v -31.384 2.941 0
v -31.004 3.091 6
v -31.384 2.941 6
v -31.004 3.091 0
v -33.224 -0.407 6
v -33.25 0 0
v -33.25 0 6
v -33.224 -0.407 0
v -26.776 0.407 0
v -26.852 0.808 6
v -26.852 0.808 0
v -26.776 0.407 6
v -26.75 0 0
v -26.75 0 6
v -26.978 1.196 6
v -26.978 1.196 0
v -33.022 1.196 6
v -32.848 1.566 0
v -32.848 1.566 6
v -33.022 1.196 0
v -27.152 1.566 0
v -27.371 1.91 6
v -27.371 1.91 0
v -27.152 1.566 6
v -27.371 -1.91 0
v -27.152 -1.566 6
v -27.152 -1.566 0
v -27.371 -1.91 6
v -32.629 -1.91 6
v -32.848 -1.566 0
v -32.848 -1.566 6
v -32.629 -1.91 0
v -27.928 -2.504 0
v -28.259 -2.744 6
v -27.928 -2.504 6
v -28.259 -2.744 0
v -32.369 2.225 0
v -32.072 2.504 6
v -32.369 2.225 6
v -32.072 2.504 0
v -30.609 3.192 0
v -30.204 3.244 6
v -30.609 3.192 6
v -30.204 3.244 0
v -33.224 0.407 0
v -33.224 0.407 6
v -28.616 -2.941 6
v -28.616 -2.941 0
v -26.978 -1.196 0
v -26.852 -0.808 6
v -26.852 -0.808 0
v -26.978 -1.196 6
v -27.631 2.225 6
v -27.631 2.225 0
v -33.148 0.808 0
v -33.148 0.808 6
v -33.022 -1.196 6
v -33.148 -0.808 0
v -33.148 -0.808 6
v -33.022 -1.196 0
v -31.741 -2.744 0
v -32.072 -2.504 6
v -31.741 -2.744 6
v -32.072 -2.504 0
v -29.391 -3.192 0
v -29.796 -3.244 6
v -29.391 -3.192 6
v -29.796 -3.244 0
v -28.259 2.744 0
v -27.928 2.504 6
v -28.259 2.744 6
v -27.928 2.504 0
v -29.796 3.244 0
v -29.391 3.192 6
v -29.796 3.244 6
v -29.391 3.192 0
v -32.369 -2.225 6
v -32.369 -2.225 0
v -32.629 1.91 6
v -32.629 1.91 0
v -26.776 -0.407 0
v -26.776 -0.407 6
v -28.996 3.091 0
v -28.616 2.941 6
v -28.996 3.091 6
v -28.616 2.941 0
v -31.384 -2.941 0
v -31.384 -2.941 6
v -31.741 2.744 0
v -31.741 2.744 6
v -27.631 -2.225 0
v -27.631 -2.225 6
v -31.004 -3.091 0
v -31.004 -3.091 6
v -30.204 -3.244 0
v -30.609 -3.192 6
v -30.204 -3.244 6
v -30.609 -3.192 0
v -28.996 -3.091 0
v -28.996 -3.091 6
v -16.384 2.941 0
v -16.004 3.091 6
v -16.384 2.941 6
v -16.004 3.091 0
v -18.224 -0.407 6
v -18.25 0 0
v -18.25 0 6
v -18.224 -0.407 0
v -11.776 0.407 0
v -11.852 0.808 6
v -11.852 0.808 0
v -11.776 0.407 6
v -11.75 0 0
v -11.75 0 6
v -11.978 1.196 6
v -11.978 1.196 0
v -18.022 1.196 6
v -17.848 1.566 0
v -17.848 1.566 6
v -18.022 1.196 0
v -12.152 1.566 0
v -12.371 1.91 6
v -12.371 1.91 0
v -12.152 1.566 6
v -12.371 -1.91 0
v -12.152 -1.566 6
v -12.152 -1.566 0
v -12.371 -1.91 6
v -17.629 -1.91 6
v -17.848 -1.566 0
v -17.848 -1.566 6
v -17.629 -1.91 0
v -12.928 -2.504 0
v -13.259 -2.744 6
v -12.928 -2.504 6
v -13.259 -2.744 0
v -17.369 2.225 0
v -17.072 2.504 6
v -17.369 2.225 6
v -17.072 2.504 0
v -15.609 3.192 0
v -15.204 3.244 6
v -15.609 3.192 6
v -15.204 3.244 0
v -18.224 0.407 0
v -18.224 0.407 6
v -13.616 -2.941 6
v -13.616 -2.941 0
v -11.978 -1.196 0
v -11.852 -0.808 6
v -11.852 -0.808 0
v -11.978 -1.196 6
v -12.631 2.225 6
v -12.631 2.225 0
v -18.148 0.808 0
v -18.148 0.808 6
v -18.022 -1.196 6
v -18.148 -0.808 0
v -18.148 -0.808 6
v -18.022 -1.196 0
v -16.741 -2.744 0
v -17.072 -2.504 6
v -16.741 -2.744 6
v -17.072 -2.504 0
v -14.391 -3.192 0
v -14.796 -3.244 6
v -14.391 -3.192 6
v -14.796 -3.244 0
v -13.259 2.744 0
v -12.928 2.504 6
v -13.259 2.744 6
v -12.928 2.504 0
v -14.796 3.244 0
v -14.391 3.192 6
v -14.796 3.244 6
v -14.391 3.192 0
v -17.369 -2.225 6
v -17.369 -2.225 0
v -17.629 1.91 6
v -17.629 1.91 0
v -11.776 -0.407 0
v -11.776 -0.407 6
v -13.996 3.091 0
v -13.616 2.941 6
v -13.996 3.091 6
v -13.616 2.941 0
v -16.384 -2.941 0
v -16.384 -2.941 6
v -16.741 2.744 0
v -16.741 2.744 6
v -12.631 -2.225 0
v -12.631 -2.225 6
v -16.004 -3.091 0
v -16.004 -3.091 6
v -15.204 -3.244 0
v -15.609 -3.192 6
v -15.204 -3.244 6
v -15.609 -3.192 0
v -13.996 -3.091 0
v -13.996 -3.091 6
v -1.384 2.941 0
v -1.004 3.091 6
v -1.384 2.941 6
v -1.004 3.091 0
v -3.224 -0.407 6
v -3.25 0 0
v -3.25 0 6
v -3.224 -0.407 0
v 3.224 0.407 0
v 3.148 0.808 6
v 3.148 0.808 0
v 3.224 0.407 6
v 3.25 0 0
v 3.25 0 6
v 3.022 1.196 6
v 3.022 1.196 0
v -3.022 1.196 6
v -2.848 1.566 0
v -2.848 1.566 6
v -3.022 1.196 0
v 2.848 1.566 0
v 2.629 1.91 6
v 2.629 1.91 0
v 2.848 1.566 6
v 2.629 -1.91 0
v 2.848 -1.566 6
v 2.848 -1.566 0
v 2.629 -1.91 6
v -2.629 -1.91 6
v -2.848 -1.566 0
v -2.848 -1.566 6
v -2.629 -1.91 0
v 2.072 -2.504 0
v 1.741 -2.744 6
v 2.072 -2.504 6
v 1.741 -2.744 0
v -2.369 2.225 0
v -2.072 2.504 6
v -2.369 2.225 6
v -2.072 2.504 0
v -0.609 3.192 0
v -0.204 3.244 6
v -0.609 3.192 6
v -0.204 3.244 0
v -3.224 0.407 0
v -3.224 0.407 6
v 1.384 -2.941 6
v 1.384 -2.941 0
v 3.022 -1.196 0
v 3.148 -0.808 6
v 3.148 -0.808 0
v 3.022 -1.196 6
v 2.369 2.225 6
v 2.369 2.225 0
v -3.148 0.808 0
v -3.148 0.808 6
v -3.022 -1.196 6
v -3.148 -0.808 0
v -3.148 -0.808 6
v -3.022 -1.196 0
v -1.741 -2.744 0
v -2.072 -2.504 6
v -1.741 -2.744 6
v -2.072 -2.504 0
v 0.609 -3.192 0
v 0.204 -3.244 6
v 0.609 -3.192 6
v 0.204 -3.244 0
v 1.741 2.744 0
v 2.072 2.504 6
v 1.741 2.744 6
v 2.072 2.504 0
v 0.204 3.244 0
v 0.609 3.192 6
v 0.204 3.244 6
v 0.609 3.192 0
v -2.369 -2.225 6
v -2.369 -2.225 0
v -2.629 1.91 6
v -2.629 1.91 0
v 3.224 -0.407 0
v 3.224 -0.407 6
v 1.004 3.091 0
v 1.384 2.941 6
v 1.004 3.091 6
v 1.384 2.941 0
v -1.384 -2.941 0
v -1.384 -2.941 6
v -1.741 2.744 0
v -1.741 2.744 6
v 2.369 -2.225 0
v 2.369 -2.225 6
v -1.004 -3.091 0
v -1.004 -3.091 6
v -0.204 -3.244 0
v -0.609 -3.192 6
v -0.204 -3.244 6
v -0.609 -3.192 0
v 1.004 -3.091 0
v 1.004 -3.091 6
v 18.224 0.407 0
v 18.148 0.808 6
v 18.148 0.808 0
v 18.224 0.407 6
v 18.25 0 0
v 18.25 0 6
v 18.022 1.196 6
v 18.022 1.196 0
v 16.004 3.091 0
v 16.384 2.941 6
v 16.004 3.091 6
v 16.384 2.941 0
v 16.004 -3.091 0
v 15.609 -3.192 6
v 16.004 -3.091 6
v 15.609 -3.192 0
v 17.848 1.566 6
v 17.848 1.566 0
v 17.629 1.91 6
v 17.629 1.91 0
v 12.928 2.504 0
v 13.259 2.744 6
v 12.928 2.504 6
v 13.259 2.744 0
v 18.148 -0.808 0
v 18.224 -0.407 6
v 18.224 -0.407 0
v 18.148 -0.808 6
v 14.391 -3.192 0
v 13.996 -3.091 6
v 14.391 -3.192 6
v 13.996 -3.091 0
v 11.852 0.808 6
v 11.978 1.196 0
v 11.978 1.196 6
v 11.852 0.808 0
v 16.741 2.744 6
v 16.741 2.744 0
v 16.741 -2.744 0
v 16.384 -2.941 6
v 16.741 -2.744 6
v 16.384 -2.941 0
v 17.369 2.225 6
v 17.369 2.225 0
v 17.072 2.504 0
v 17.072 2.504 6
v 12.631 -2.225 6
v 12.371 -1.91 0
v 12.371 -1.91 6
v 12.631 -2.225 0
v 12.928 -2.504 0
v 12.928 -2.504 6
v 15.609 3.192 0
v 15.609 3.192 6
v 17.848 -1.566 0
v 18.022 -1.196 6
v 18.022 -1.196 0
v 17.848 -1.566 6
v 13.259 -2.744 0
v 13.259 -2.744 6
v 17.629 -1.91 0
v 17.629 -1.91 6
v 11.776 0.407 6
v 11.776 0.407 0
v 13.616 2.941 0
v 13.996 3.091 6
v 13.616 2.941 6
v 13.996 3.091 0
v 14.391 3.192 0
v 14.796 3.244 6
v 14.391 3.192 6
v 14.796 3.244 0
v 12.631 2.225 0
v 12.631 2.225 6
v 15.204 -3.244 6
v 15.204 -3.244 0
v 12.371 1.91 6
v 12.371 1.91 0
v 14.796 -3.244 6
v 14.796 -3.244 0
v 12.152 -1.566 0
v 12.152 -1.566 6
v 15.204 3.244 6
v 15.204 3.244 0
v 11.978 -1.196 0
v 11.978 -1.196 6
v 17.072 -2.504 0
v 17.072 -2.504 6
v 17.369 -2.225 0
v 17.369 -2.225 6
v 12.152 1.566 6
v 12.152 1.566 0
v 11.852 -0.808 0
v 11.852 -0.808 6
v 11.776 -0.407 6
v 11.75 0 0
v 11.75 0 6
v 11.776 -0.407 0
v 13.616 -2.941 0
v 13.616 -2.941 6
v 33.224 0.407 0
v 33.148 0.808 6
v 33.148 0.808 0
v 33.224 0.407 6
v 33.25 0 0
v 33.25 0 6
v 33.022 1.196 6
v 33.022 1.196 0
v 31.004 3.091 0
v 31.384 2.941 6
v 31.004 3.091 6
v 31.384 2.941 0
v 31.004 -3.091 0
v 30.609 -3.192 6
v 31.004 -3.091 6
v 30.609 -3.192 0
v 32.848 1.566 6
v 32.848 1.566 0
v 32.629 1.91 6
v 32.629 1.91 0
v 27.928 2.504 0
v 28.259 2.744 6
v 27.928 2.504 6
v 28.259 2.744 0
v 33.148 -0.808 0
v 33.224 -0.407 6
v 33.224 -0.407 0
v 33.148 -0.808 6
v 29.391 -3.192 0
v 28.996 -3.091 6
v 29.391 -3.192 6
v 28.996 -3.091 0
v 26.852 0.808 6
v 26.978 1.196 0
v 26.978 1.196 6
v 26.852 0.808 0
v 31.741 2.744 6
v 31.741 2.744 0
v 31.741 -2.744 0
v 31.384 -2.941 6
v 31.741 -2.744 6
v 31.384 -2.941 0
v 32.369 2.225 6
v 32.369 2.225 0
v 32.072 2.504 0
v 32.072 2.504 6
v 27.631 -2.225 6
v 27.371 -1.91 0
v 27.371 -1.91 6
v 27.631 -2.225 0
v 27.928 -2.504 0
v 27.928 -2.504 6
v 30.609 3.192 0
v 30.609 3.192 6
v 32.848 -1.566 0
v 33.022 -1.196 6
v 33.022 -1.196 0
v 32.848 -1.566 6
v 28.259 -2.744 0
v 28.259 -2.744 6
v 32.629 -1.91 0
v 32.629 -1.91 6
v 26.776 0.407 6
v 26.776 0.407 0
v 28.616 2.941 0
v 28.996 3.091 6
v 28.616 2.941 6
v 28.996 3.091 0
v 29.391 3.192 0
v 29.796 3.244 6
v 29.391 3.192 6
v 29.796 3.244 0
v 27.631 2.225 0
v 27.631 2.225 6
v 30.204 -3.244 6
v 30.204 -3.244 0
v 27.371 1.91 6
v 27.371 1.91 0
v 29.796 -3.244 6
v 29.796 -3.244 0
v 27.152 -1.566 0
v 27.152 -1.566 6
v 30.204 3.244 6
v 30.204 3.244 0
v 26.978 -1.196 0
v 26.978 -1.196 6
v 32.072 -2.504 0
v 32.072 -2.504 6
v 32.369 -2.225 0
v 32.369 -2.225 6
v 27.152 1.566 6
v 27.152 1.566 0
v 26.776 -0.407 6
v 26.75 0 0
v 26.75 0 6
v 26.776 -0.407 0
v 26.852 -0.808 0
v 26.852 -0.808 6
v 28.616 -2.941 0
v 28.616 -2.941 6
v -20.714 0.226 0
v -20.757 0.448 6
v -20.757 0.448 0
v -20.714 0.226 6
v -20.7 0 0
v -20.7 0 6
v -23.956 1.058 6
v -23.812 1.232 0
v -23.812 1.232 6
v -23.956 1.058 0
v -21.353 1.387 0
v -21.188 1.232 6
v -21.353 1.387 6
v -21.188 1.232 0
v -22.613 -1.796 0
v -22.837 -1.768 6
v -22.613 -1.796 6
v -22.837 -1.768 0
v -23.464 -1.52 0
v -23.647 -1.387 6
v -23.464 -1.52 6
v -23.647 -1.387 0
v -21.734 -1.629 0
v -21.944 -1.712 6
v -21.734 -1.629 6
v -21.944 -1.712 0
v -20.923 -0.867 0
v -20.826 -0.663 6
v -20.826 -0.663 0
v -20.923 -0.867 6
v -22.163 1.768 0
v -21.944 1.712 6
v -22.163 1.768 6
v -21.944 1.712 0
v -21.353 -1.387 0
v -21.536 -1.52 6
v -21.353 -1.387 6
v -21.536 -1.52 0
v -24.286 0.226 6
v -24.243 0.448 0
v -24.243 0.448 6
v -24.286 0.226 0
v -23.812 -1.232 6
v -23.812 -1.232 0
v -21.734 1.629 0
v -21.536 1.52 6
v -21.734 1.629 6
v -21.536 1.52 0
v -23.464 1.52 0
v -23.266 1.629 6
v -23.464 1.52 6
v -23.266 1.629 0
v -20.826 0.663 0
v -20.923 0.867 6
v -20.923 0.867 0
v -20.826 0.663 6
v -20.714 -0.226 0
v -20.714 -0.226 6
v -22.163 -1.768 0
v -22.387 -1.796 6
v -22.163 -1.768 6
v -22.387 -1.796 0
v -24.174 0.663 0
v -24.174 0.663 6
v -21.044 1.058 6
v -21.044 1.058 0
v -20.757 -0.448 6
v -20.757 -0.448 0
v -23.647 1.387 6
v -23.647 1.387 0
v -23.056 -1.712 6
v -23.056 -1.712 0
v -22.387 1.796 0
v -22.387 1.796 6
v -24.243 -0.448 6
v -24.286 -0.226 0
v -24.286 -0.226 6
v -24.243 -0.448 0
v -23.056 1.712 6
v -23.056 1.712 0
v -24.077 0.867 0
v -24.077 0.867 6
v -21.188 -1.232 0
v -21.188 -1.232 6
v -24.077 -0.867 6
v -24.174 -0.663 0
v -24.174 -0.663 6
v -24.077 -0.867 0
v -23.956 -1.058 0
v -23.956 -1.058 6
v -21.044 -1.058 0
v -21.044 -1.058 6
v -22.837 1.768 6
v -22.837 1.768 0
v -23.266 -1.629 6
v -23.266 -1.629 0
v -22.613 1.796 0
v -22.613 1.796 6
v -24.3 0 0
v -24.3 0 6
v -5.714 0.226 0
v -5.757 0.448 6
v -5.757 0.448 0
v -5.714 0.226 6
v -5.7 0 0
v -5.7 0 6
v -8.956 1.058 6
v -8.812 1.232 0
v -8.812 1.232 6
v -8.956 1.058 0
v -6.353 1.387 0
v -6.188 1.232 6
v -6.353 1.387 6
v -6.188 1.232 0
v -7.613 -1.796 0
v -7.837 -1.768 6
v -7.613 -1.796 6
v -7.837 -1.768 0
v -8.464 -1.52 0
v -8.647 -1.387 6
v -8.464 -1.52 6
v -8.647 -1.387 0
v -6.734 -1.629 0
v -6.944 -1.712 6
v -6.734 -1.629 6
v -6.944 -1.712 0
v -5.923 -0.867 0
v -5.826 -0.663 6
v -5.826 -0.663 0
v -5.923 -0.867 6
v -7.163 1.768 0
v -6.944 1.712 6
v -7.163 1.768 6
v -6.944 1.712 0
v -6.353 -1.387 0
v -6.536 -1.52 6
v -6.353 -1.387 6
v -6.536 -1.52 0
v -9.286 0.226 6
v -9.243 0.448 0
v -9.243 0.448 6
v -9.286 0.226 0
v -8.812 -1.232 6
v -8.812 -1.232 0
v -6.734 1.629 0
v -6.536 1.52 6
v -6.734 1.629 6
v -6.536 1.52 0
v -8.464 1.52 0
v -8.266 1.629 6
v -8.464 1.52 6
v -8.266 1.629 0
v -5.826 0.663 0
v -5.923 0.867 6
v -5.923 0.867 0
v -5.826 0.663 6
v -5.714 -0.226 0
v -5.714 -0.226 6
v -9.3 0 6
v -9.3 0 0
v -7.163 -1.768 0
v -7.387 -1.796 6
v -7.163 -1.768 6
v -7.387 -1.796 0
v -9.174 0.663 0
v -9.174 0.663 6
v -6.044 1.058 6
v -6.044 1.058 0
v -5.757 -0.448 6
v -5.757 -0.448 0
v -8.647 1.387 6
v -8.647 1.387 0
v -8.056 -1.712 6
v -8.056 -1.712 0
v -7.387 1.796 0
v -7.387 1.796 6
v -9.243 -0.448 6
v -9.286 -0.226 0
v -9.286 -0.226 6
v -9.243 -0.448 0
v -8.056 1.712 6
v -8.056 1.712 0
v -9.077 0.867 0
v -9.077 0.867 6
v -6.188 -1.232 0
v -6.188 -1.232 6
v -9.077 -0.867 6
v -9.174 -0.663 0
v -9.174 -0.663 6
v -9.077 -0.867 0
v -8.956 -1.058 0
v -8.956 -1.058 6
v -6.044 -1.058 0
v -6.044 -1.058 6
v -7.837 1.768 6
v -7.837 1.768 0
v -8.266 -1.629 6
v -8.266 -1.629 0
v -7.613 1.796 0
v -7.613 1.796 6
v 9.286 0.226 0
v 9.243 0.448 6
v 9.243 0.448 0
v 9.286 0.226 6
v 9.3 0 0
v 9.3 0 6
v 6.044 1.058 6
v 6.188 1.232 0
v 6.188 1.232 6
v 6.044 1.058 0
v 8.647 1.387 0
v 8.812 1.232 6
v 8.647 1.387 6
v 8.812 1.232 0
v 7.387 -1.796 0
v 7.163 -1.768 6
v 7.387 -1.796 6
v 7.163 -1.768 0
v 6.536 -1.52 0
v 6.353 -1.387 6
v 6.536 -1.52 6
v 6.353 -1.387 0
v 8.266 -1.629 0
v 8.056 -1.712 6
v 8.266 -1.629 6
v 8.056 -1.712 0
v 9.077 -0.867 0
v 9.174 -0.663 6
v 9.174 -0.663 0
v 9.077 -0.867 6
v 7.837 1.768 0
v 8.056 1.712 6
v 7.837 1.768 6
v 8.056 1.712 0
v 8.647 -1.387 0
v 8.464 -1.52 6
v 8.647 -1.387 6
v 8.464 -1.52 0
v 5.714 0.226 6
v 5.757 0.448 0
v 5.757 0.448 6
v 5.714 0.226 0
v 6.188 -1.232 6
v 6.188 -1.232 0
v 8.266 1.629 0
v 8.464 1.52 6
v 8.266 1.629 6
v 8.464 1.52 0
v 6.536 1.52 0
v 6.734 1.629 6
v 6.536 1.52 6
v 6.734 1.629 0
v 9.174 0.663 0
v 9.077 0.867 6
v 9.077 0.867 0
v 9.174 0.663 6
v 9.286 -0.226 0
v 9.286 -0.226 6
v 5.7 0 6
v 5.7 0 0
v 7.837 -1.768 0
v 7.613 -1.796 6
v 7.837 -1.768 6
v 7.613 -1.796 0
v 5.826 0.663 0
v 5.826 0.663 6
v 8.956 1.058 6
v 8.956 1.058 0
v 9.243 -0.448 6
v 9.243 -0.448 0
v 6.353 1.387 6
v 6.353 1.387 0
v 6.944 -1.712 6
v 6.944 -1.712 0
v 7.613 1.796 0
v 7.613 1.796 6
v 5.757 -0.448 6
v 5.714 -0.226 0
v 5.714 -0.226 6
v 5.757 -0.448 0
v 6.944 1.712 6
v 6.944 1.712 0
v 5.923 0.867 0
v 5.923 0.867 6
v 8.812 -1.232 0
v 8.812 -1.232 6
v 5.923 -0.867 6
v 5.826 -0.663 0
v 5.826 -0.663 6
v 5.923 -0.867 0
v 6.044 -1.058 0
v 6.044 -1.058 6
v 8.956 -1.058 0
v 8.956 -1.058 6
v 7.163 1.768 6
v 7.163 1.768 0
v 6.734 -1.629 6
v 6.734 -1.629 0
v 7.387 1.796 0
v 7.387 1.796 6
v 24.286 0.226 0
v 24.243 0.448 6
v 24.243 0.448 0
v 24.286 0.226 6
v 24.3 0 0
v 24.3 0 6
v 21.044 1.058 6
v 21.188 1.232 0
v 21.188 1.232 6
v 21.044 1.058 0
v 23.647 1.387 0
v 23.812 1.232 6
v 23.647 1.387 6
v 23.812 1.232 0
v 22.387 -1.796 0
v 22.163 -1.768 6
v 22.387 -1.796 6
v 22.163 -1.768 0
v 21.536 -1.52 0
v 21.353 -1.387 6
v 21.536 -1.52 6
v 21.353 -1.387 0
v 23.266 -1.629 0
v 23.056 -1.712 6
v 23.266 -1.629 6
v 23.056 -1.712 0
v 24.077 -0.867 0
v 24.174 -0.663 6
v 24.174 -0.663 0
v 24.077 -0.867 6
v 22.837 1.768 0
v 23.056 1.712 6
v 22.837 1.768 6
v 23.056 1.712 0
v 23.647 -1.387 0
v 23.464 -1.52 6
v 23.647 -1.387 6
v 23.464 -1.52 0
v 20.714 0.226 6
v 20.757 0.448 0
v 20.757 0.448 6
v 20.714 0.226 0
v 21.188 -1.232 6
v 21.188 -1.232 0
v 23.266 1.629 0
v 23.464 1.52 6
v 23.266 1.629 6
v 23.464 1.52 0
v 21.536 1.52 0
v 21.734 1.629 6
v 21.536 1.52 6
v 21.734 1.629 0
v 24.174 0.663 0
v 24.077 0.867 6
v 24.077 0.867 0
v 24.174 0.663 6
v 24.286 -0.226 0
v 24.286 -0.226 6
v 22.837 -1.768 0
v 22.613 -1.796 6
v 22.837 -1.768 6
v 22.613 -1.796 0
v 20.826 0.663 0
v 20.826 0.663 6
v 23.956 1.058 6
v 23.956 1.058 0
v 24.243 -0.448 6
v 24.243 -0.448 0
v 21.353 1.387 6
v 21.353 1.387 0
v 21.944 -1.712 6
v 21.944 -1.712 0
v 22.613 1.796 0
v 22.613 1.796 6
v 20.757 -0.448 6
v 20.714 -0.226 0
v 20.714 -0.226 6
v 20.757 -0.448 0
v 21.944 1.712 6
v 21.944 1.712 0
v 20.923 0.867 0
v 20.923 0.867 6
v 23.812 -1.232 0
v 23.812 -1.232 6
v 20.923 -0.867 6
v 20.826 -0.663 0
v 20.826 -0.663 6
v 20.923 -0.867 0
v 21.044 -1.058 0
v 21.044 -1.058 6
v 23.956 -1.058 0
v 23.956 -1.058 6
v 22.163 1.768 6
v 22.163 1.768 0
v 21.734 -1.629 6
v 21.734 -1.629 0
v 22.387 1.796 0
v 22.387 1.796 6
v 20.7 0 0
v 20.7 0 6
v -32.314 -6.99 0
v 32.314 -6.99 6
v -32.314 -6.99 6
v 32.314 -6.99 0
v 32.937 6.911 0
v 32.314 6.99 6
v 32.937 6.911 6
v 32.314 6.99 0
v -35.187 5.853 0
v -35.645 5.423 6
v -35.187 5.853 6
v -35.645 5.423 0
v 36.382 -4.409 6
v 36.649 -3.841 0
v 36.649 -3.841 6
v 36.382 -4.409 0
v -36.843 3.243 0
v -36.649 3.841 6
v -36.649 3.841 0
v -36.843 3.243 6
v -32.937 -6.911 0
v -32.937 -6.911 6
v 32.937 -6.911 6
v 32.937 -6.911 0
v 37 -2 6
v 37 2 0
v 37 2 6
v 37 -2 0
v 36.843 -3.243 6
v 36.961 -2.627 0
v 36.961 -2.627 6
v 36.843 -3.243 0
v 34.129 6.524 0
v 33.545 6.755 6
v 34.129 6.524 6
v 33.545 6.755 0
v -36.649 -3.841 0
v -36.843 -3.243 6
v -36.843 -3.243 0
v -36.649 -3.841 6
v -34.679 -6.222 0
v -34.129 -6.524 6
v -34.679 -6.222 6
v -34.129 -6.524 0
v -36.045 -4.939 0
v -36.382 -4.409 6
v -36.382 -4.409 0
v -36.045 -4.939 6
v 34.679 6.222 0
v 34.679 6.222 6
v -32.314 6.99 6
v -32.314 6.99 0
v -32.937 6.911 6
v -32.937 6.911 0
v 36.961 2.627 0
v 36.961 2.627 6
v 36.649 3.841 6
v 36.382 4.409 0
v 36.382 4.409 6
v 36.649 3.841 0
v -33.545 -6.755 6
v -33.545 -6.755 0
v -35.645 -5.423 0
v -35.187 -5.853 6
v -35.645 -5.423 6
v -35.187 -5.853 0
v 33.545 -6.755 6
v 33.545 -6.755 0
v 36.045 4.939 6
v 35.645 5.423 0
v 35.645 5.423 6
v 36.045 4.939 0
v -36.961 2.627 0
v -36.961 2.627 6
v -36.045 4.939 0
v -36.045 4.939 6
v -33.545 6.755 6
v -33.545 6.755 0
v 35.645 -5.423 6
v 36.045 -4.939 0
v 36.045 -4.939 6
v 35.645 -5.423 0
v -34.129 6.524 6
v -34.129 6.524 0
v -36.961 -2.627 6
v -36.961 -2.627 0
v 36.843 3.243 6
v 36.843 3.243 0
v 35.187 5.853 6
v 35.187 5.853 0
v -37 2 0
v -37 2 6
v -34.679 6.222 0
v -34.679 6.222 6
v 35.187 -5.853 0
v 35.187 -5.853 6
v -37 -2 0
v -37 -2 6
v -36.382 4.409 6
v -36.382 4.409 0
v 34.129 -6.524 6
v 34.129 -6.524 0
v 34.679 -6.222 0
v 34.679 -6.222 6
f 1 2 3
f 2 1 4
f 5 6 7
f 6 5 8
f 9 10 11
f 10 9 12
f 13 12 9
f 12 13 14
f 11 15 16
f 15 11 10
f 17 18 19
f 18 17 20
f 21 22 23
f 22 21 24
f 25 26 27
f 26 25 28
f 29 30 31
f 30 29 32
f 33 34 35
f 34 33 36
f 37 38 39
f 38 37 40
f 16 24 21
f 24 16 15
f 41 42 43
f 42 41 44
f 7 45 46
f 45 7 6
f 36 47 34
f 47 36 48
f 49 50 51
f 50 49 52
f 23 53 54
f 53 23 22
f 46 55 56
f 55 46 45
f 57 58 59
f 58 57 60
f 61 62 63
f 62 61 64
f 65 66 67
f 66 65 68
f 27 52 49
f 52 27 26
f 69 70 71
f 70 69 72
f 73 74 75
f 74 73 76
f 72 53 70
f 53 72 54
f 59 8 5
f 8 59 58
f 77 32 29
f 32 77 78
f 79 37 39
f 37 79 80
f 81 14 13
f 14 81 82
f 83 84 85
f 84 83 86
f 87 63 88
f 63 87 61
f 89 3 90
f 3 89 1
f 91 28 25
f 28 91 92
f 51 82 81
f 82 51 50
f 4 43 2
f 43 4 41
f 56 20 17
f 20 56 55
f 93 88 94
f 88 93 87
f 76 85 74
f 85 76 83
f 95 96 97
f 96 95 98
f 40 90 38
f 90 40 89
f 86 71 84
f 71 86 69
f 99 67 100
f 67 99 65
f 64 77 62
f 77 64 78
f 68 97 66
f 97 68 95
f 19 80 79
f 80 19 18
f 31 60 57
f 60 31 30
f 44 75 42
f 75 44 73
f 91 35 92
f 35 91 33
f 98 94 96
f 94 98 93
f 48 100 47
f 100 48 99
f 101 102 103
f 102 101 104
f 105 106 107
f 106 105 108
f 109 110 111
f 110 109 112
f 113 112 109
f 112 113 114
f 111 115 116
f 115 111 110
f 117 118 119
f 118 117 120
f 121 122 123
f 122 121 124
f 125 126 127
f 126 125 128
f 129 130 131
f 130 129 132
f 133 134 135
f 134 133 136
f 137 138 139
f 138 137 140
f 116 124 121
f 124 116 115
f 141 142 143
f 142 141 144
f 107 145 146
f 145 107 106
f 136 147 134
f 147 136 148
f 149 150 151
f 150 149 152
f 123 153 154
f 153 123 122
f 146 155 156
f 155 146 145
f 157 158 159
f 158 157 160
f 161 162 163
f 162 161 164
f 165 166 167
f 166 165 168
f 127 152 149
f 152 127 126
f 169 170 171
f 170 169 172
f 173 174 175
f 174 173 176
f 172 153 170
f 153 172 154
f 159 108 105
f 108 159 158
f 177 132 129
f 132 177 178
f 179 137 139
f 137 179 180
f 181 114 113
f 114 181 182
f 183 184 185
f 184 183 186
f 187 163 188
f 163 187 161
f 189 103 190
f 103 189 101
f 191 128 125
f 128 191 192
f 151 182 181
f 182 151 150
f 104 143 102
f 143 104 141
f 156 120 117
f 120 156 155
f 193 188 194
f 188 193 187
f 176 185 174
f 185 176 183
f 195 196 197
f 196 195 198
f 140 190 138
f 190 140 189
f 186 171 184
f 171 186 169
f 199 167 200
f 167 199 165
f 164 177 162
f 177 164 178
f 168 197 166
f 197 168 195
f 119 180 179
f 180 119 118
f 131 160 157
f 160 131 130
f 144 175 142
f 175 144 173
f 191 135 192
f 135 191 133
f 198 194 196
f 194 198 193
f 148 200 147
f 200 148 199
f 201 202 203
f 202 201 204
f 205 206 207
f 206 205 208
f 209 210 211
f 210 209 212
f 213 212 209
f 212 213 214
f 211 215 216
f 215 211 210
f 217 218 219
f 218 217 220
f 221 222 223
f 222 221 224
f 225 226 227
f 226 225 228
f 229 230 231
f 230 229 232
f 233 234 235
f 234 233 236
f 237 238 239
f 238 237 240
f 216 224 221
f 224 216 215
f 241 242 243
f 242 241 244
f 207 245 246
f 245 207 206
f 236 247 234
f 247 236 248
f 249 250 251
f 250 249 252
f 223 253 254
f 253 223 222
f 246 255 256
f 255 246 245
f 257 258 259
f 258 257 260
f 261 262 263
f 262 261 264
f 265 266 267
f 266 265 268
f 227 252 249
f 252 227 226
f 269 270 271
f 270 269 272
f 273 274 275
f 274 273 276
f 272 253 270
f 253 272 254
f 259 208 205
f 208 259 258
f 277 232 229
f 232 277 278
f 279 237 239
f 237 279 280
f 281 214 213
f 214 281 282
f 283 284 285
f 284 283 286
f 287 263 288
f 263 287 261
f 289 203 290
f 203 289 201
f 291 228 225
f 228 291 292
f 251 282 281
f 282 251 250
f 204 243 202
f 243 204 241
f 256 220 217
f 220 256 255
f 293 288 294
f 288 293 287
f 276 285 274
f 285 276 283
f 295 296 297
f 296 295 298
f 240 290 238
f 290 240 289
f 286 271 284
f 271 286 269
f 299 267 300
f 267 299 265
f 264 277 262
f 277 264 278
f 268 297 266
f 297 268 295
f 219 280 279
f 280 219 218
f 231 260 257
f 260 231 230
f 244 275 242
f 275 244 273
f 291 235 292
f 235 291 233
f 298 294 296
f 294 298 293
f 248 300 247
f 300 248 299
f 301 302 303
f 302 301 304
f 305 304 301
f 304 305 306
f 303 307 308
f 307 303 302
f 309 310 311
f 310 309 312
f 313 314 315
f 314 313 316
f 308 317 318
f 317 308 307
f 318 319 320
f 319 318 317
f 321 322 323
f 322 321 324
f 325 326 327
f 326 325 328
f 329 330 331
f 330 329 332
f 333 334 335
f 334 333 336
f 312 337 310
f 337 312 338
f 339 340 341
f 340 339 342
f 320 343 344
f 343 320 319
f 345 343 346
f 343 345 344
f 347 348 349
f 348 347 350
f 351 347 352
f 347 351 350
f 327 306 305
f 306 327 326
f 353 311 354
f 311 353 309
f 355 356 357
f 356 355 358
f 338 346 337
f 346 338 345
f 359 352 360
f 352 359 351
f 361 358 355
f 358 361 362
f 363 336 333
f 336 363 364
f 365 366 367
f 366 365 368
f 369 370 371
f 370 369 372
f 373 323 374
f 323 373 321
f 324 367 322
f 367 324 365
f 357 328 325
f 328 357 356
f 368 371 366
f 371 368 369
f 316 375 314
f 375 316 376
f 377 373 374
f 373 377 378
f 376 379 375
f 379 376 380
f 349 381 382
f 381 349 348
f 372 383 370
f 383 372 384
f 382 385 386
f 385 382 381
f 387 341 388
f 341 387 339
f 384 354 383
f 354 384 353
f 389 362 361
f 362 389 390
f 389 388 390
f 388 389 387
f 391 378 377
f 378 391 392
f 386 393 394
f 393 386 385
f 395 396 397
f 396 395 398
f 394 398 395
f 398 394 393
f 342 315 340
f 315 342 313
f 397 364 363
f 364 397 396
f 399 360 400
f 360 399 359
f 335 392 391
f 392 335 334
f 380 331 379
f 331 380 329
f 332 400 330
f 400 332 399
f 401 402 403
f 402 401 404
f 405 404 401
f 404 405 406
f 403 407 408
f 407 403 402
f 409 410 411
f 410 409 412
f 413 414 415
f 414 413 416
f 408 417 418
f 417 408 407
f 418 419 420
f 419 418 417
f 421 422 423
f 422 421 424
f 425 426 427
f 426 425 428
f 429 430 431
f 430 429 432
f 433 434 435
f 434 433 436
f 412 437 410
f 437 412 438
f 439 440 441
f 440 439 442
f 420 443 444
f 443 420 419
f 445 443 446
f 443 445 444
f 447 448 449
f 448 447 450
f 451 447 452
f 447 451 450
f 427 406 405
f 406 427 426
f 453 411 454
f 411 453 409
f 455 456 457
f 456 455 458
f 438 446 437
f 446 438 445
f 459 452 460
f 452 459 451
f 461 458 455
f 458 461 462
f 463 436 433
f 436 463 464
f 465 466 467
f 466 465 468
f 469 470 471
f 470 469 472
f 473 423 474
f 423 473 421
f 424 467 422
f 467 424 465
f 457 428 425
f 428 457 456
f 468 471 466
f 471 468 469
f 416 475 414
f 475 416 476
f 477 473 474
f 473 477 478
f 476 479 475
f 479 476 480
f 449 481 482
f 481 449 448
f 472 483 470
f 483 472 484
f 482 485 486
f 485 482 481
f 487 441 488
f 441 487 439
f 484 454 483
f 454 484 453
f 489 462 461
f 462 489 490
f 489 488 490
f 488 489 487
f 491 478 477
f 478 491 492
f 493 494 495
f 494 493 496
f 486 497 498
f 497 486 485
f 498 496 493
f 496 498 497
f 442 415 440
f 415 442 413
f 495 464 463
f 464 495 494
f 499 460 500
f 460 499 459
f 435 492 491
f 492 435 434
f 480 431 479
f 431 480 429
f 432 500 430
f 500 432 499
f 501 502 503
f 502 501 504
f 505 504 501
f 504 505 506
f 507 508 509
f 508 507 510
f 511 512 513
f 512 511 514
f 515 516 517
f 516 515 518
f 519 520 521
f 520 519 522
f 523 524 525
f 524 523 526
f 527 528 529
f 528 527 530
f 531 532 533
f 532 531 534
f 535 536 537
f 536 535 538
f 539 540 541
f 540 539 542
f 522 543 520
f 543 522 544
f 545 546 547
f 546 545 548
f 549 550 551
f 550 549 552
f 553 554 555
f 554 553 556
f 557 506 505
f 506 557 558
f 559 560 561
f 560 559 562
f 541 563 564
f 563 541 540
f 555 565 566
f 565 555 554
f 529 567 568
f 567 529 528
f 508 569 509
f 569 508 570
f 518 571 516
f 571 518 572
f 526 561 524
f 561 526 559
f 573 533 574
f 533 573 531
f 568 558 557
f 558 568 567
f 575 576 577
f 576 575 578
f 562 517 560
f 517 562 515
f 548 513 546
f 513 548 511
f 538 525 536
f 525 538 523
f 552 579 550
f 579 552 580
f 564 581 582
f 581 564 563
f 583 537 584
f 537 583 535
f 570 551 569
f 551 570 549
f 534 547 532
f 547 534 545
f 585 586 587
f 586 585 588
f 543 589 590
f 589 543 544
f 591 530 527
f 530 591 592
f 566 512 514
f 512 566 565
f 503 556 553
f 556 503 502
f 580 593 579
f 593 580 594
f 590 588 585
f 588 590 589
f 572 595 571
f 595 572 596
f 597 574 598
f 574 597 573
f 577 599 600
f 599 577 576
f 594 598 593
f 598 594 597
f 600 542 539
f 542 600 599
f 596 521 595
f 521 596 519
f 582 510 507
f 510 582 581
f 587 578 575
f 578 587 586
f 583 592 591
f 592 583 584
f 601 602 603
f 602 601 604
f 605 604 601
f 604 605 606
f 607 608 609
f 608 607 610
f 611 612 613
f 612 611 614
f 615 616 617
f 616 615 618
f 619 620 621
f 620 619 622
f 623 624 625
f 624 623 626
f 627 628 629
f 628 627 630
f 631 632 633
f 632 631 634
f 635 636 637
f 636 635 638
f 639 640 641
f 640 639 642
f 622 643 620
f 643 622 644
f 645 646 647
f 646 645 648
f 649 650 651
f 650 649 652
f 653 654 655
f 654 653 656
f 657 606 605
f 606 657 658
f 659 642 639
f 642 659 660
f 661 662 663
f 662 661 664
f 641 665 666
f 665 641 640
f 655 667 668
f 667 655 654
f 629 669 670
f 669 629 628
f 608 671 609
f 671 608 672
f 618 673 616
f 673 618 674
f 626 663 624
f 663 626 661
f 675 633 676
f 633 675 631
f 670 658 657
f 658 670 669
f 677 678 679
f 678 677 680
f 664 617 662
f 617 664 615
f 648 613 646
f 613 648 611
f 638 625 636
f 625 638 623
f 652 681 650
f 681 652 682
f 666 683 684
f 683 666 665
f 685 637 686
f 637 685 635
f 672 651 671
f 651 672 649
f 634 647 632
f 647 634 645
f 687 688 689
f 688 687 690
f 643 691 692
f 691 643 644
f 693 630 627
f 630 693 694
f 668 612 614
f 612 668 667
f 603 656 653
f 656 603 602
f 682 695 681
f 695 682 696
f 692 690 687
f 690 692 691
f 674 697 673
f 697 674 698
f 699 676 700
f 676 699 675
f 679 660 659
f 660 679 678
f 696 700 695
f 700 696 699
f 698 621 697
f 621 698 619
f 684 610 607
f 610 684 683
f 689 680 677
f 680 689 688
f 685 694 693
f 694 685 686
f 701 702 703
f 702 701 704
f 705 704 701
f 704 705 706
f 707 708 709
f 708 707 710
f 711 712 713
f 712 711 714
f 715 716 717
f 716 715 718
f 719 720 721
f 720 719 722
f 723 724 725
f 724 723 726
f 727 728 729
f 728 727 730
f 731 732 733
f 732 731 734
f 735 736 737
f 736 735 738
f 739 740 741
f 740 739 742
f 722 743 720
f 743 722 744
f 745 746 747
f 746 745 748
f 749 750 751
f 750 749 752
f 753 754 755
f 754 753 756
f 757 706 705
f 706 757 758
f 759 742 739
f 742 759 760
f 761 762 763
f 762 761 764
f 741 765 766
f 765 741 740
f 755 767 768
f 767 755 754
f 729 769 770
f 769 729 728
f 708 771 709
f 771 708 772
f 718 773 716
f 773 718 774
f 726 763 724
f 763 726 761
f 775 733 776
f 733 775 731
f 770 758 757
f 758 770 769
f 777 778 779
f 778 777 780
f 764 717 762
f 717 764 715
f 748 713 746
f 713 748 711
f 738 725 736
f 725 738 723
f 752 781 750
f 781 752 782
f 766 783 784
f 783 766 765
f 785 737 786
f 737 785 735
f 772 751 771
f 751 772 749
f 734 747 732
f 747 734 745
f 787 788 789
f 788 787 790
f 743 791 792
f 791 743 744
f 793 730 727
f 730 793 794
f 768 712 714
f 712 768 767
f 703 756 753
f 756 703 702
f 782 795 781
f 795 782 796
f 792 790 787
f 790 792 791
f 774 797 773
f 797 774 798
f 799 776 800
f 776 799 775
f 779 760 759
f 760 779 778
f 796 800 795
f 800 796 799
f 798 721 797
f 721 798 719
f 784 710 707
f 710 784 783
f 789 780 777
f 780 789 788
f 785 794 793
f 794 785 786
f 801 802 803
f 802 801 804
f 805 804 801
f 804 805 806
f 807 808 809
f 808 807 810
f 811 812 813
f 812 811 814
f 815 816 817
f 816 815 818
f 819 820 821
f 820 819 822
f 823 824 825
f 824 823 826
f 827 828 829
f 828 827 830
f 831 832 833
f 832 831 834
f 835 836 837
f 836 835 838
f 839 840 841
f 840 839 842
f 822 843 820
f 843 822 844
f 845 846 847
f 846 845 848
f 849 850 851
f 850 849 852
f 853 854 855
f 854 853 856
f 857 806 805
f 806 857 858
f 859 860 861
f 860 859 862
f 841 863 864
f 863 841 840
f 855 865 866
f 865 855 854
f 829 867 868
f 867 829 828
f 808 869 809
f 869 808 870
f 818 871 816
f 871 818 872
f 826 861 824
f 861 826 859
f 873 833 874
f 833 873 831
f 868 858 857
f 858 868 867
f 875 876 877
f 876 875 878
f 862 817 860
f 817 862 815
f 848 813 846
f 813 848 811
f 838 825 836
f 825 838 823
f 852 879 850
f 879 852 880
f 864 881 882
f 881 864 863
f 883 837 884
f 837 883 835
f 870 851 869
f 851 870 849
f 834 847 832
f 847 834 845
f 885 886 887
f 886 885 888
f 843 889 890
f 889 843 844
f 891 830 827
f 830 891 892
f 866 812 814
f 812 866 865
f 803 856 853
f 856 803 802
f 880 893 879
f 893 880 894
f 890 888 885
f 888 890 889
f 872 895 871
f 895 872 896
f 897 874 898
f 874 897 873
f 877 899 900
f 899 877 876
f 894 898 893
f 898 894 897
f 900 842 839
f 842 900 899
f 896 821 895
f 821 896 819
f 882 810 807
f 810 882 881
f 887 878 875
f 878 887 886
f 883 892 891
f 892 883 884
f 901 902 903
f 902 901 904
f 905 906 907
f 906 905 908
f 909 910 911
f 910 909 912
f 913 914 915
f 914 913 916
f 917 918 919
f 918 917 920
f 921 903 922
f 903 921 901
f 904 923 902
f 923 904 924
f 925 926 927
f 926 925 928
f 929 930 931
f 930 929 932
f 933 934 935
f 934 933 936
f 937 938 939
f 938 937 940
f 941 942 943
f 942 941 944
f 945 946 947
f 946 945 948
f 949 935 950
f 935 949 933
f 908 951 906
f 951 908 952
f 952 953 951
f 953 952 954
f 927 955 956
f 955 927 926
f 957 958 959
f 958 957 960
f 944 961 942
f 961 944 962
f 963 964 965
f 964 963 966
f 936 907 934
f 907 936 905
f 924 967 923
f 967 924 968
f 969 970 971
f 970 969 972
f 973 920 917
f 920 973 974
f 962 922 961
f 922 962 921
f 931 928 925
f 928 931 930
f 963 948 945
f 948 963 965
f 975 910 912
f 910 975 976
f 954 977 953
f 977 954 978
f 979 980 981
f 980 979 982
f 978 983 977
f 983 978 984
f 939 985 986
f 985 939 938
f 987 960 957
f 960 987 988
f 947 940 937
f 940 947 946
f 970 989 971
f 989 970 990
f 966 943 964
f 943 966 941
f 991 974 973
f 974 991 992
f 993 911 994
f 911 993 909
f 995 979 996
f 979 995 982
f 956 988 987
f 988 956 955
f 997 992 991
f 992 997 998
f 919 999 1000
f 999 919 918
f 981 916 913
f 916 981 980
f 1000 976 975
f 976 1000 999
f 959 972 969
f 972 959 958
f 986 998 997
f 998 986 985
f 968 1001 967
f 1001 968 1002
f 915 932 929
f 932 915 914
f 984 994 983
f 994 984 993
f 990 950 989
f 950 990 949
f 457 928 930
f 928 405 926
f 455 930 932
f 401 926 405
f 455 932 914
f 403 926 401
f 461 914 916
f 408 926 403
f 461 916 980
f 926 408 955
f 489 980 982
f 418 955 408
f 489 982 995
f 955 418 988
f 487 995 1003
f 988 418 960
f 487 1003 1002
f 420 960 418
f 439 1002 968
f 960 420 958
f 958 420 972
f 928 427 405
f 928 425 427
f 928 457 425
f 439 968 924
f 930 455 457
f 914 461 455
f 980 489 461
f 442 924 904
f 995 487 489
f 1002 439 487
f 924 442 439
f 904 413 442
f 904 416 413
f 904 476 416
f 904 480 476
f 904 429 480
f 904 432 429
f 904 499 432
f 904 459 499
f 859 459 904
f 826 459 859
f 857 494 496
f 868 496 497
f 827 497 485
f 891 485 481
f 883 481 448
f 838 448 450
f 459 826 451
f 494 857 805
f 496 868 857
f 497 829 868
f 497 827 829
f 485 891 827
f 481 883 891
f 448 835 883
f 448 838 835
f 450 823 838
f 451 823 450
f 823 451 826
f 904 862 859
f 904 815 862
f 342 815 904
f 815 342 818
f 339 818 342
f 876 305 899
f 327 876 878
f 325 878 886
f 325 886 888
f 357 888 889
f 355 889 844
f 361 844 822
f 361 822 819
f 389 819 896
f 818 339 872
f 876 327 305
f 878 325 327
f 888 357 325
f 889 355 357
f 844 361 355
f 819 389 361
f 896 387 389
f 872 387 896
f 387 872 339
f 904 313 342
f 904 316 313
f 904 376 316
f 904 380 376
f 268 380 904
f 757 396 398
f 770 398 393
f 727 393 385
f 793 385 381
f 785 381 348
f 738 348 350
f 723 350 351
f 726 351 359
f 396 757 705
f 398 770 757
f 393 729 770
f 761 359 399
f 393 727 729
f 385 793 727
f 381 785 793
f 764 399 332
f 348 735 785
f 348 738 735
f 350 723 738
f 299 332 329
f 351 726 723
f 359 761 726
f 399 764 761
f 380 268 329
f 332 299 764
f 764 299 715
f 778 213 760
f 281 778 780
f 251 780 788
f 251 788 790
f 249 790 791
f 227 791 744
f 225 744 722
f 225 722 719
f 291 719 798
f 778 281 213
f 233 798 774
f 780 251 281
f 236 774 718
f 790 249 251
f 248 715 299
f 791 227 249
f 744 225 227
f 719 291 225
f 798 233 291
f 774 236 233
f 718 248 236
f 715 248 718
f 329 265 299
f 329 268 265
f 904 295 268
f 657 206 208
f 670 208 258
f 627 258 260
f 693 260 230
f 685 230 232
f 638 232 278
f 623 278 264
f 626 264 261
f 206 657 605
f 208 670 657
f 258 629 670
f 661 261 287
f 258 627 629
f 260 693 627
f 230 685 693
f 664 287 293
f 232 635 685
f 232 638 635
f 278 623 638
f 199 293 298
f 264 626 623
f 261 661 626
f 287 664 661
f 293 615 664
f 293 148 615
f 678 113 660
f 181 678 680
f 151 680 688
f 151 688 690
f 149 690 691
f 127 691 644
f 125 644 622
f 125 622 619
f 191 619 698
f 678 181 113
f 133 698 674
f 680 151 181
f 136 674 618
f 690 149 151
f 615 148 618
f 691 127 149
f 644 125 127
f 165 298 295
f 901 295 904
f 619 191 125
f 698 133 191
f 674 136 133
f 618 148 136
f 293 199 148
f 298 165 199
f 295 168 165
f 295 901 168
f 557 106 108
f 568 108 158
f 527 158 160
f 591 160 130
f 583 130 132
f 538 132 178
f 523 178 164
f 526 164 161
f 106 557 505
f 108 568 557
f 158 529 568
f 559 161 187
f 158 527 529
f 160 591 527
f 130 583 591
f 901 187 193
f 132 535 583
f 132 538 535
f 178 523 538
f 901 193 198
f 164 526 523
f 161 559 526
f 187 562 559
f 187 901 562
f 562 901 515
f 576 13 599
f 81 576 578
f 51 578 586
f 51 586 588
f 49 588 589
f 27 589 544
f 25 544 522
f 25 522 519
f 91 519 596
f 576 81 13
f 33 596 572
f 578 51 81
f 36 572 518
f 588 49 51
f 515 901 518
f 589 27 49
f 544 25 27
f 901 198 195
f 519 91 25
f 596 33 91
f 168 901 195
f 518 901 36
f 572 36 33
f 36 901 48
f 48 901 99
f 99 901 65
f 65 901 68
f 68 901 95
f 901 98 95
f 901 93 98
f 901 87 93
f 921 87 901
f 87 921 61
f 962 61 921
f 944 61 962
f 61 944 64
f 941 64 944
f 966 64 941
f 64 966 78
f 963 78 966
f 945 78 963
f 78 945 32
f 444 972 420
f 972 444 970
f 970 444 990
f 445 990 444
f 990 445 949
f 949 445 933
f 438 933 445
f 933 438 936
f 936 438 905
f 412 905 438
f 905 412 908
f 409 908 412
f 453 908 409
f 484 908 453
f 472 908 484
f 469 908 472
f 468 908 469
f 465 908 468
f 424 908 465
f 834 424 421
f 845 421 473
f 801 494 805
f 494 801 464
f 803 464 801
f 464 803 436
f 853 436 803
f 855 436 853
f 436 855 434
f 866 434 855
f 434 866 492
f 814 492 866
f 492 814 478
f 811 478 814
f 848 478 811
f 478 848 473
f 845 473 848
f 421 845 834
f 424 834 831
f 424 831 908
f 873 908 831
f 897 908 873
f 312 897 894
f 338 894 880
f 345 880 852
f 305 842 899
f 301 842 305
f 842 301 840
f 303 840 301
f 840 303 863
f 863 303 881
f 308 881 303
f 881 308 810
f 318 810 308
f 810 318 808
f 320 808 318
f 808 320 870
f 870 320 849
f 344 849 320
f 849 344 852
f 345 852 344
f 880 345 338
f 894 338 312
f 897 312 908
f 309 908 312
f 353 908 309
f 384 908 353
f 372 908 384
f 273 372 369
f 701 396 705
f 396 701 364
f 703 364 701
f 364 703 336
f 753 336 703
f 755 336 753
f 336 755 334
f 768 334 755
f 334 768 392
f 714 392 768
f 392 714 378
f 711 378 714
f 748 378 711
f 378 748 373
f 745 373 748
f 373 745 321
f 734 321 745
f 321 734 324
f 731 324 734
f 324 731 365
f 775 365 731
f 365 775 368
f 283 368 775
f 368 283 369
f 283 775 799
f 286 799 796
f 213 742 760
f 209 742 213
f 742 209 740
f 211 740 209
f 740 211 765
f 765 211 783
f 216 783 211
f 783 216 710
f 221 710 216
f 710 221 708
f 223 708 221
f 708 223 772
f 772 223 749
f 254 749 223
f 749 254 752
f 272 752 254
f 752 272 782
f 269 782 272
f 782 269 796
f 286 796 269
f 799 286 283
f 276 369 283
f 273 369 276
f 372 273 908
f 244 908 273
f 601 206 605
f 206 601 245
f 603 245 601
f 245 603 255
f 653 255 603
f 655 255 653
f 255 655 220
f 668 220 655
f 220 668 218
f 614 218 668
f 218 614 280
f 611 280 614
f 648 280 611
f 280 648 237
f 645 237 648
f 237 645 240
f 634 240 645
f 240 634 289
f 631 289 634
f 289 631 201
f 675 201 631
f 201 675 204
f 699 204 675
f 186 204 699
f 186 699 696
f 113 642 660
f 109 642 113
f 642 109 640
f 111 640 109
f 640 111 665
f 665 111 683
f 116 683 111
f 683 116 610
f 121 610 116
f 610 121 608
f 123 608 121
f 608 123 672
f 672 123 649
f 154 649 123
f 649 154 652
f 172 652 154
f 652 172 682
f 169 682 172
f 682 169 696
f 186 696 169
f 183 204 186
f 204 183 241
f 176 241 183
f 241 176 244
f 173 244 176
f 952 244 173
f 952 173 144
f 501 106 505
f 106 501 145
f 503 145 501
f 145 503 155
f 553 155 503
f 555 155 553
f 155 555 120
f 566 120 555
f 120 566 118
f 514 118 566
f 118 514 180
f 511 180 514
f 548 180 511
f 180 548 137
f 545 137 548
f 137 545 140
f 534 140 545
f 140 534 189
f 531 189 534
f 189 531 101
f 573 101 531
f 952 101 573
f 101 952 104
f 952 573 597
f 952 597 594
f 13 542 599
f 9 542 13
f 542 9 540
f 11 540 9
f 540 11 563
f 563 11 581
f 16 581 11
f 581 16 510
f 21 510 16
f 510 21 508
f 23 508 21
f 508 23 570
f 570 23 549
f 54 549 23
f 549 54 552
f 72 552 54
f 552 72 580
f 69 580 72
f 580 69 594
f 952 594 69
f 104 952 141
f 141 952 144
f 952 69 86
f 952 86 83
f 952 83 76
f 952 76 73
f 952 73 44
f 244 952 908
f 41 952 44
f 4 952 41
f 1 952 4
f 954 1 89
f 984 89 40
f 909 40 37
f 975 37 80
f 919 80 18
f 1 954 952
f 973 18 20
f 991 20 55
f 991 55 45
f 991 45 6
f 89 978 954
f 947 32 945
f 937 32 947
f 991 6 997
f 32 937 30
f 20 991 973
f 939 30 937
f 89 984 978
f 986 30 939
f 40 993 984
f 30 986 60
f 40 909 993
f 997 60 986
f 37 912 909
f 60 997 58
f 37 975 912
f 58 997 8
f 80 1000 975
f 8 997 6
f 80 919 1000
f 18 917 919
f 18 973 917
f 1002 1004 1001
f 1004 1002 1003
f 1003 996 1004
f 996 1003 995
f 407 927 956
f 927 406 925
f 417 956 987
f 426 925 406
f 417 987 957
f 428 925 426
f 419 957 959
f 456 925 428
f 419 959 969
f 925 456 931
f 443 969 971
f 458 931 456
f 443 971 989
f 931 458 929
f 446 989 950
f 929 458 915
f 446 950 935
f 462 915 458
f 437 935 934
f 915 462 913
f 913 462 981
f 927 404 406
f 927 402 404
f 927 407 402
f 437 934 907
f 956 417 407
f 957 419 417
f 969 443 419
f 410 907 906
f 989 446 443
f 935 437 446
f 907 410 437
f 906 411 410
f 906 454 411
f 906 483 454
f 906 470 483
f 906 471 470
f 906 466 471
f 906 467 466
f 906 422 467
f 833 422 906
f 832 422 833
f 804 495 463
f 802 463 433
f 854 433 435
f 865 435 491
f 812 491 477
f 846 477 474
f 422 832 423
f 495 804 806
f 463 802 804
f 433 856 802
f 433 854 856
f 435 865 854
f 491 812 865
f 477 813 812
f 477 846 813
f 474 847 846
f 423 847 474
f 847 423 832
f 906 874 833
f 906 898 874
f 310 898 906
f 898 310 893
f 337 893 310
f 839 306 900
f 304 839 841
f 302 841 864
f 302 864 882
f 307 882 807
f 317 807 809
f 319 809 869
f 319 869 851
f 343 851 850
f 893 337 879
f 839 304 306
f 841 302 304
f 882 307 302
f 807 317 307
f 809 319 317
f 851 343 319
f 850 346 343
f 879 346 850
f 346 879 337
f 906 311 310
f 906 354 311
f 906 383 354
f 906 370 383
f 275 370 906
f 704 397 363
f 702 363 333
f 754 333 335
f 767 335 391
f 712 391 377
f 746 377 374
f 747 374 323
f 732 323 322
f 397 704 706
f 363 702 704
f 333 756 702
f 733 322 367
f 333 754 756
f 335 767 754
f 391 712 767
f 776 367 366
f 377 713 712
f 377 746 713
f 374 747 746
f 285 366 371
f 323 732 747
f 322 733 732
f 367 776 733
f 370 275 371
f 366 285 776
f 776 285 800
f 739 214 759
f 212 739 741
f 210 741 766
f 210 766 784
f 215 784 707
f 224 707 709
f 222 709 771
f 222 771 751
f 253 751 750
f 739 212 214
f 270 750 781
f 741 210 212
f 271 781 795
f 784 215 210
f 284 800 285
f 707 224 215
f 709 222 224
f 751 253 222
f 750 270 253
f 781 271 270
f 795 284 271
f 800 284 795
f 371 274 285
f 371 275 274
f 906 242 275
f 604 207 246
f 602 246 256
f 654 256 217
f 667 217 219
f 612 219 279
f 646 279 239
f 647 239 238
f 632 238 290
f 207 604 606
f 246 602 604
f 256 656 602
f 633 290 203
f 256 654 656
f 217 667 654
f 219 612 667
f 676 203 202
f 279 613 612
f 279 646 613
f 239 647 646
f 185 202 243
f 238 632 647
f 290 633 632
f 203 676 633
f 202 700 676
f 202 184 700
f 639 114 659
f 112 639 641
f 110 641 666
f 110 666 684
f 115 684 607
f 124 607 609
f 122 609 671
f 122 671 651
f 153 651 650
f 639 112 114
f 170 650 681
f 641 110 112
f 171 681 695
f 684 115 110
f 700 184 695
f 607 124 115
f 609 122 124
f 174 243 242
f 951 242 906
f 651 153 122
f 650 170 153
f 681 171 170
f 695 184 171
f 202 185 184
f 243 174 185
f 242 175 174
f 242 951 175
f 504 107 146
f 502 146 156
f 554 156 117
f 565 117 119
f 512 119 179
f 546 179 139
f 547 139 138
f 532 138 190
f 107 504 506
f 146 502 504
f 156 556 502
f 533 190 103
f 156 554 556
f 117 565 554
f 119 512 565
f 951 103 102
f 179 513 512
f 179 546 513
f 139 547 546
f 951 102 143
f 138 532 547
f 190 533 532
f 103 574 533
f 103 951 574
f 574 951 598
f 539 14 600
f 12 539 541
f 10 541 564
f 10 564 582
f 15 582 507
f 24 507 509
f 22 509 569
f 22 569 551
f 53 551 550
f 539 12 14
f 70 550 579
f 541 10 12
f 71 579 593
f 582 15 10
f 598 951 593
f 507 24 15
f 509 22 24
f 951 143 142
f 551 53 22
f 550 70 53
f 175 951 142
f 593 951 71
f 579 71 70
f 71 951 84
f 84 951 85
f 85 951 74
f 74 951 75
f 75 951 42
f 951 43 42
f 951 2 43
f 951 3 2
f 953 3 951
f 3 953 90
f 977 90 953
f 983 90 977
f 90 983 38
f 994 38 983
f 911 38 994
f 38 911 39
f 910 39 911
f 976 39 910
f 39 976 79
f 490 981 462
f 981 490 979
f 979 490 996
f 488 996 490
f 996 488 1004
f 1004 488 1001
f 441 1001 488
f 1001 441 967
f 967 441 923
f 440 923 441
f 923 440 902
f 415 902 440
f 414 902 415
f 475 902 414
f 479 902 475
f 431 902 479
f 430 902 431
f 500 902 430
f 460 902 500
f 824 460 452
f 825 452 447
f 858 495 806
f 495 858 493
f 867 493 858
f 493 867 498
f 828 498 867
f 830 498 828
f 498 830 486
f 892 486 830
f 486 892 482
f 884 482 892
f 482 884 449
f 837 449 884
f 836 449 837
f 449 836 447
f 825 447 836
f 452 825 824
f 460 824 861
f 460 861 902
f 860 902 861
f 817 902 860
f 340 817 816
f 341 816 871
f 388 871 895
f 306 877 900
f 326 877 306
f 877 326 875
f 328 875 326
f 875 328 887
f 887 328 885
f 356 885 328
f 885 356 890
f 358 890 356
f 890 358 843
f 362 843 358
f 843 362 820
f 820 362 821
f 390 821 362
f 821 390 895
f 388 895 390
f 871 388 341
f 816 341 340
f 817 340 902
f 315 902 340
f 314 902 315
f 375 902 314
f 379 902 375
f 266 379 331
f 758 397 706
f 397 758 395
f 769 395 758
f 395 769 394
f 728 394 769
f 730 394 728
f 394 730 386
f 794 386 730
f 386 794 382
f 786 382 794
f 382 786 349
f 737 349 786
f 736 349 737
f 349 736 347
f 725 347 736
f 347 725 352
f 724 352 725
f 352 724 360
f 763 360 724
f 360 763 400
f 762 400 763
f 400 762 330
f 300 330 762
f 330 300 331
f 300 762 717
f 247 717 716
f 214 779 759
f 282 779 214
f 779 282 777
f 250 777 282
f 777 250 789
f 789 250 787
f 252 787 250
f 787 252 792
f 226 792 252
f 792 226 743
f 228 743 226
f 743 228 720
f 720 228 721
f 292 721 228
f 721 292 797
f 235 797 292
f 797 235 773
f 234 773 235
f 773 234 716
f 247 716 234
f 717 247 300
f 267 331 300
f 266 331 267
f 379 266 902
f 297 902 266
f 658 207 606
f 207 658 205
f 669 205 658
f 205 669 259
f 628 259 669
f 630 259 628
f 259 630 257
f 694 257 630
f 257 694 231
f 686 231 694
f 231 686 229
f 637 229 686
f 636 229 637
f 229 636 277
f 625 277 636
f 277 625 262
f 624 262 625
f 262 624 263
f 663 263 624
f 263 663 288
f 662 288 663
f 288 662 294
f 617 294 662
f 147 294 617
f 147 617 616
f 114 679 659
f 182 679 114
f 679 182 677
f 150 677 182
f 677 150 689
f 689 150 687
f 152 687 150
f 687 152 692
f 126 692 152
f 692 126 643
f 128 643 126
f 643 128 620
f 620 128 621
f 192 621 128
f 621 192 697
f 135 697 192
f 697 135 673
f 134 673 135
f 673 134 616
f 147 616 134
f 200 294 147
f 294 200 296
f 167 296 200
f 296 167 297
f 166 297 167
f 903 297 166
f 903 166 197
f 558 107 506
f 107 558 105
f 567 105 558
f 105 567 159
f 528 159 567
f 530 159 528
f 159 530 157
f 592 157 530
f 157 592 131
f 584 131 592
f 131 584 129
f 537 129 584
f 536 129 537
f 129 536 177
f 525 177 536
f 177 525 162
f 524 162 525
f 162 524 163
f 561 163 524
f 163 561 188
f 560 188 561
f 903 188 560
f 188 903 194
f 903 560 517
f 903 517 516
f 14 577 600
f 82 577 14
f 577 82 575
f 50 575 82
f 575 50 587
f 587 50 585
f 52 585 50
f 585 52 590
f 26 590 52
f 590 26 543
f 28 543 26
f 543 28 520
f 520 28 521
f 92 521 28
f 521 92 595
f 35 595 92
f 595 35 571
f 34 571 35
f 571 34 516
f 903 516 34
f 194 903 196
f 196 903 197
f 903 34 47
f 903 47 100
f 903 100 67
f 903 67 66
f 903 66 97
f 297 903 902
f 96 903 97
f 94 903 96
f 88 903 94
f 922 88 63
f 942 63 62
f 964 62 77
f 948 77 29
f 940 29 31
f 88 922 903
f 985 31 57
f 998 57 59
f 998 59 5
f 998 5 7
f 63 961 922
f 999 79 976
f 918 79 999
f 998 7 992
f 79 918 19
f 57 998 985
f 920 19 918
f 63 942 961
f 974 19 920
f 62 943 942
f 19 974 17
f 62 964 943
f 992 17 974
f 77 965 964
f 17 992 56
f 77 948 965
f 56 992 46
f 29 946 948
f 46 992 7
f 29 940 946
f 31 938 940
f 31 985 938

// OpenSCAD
$fn = 50;


difference() {
	union() {
		*color(alpha = 1.0000000000, c = "gray") {
			translate(v = [0, 7, 0]) {
				linear_extrude(height = 1) {
					text(font = "Arial:style=Bold", halign = "center", size = 4.5000000000, text = "COMMENT plate main", valign = "center");
				}
			}
		}
		*color(alpha = 1.0000000000, c = "gray") {
			translate(v = [0, 14, 0]) {
				linear_extrude(height = 1) {
					text(font = "Arial:style=Bold", halign = "center", size = 4.5000000000, text = "COMMENT description oobb_plate_shape_p_type_6_depth_5_width_1_height_6_thickness_true_both_holes", valign = "center");
				}
			}
		}
		hull() {
			translate(v = [-32.0000000000, 2.0000000000, 0]) {
				cylinder(h = 6, r = 5);
			}
			translate(v = [32.0000000000, 2.0000000000, 0]) {
				cylinder(h = 6, r = 5);
			}
			translate(v = [-32.0000000000, -2.0000000000, 0]) {
				cylinder(h = 6, r = 5);
			}
			translate(v = [32.0000000000, -2.0000000000, 0]) {
				cylinder(h = 6, r = 5);
			}
		}
	}
	union() {
		*color(alpha = 1.0000000000, c = "gray") {
			translate(v = [0, 7, 0]) {
				linear_extrude(height = 1) {
					text(font = "Arial:style=Bold", halign = "center", size = 4.5000000000, text = "COMMENT holes main", valign = "center");
				}
			}
		}
		*color(alpha = 1.0000000000, c = "gray") {
			translate(v = [0, 14, 0]) {
				linear_extrude(height = 1) {
					text(font = "Arial:style=Bold", halign = "center", size = 4.5000000000, text = "COMMENT description oobb_holes_shape_n_type_5_width_1_height_6_thickness_true_both_holes", valign = "center");
				}
			}
		}
		translate(v = [-30.0000000000, 0.0000000000, 0]) {
			translate(v = [0, 0, -50]) {
				cylinder(h = 100, r = 3.2500000000);
			}
		}
		translate(v = [-15.0000000000, 0.0000000000, 0]) {
			translate(v = [0, 0, -50]) {
				cylinder(h = 100, r = 3.2500000000);
			}
		}
		translate(v = [0, 0, -50]) {
			cylinder(h = 100, r = 3.2500000000);
		}
		translate(v = [15.0000000000, 0.0000000000, 0]) {
			translate(v = [0, 0, -50]) {
				cylinder(h = 100, r = 3.2500000000);
			}
		}
		translate(v = [30.0000000000, 0.0000000000, 0]) {
			translate(v = [0, 0, -50]) {
				cylinder(h = 100, r = 3.2500000000);
			}
		}
		translate(v = [-30.0000000000, 0.0000000000, 0]) {
			translate(v = [0, 0, -50]) {
				cylinder(h = 100, r = 1.8000000000);
			}
		}
		translate(v = [-22.5000000000, 0.0000000000, 0]) {
			translate(v = [0, 0, -50]) {
				cylinder(h = 100, r = 1.8000000000);
			}
		}
		translate(v = [-15.0000000000, 0.0000000000, 0]) {
			translate(v = [0, 0, -50]) {
				cylinder(h = 100, r = 1.8000000000);
			}
		}
		translate(v = [-7.5000000000, 0.0000000000, 0]) {
			translate(v = [0, 0, -50]) {
				cylinder(h = 100, r = 1.8000000000);
			}
		}
		translate(v = [0, 0, -50]) {
			cylinder(h = 100, r = 1.8000000000);
		}
		translate(v = [7.5000000000, 0.0000000000, 0]) {
			translate(v = [0, 0, -50]) {
				cylinder(h = 100, r = 1.8000000000);
			}
		}
		translate(v = [15.0000000000, 0.0000000000, 0]) {
			translate(v = [0, 0, -50]) {
				cylinder(h = 100, r = 1.8000000000);
			}
		}
		translate(v = [22.5000000000, 0.0000000000, 0]) {
			translate(v = [0, 0, -50]) {
				cylinder(h = 100, r = 1.8000000000);
			}
		}
		translate(v = [30.0000000000, 0.0000000000, 0]) {
			translate(v = [0, 0, -50]) {
				cylinder(h = 100, r = 1.8000000000);
			}
		}
	}
}
